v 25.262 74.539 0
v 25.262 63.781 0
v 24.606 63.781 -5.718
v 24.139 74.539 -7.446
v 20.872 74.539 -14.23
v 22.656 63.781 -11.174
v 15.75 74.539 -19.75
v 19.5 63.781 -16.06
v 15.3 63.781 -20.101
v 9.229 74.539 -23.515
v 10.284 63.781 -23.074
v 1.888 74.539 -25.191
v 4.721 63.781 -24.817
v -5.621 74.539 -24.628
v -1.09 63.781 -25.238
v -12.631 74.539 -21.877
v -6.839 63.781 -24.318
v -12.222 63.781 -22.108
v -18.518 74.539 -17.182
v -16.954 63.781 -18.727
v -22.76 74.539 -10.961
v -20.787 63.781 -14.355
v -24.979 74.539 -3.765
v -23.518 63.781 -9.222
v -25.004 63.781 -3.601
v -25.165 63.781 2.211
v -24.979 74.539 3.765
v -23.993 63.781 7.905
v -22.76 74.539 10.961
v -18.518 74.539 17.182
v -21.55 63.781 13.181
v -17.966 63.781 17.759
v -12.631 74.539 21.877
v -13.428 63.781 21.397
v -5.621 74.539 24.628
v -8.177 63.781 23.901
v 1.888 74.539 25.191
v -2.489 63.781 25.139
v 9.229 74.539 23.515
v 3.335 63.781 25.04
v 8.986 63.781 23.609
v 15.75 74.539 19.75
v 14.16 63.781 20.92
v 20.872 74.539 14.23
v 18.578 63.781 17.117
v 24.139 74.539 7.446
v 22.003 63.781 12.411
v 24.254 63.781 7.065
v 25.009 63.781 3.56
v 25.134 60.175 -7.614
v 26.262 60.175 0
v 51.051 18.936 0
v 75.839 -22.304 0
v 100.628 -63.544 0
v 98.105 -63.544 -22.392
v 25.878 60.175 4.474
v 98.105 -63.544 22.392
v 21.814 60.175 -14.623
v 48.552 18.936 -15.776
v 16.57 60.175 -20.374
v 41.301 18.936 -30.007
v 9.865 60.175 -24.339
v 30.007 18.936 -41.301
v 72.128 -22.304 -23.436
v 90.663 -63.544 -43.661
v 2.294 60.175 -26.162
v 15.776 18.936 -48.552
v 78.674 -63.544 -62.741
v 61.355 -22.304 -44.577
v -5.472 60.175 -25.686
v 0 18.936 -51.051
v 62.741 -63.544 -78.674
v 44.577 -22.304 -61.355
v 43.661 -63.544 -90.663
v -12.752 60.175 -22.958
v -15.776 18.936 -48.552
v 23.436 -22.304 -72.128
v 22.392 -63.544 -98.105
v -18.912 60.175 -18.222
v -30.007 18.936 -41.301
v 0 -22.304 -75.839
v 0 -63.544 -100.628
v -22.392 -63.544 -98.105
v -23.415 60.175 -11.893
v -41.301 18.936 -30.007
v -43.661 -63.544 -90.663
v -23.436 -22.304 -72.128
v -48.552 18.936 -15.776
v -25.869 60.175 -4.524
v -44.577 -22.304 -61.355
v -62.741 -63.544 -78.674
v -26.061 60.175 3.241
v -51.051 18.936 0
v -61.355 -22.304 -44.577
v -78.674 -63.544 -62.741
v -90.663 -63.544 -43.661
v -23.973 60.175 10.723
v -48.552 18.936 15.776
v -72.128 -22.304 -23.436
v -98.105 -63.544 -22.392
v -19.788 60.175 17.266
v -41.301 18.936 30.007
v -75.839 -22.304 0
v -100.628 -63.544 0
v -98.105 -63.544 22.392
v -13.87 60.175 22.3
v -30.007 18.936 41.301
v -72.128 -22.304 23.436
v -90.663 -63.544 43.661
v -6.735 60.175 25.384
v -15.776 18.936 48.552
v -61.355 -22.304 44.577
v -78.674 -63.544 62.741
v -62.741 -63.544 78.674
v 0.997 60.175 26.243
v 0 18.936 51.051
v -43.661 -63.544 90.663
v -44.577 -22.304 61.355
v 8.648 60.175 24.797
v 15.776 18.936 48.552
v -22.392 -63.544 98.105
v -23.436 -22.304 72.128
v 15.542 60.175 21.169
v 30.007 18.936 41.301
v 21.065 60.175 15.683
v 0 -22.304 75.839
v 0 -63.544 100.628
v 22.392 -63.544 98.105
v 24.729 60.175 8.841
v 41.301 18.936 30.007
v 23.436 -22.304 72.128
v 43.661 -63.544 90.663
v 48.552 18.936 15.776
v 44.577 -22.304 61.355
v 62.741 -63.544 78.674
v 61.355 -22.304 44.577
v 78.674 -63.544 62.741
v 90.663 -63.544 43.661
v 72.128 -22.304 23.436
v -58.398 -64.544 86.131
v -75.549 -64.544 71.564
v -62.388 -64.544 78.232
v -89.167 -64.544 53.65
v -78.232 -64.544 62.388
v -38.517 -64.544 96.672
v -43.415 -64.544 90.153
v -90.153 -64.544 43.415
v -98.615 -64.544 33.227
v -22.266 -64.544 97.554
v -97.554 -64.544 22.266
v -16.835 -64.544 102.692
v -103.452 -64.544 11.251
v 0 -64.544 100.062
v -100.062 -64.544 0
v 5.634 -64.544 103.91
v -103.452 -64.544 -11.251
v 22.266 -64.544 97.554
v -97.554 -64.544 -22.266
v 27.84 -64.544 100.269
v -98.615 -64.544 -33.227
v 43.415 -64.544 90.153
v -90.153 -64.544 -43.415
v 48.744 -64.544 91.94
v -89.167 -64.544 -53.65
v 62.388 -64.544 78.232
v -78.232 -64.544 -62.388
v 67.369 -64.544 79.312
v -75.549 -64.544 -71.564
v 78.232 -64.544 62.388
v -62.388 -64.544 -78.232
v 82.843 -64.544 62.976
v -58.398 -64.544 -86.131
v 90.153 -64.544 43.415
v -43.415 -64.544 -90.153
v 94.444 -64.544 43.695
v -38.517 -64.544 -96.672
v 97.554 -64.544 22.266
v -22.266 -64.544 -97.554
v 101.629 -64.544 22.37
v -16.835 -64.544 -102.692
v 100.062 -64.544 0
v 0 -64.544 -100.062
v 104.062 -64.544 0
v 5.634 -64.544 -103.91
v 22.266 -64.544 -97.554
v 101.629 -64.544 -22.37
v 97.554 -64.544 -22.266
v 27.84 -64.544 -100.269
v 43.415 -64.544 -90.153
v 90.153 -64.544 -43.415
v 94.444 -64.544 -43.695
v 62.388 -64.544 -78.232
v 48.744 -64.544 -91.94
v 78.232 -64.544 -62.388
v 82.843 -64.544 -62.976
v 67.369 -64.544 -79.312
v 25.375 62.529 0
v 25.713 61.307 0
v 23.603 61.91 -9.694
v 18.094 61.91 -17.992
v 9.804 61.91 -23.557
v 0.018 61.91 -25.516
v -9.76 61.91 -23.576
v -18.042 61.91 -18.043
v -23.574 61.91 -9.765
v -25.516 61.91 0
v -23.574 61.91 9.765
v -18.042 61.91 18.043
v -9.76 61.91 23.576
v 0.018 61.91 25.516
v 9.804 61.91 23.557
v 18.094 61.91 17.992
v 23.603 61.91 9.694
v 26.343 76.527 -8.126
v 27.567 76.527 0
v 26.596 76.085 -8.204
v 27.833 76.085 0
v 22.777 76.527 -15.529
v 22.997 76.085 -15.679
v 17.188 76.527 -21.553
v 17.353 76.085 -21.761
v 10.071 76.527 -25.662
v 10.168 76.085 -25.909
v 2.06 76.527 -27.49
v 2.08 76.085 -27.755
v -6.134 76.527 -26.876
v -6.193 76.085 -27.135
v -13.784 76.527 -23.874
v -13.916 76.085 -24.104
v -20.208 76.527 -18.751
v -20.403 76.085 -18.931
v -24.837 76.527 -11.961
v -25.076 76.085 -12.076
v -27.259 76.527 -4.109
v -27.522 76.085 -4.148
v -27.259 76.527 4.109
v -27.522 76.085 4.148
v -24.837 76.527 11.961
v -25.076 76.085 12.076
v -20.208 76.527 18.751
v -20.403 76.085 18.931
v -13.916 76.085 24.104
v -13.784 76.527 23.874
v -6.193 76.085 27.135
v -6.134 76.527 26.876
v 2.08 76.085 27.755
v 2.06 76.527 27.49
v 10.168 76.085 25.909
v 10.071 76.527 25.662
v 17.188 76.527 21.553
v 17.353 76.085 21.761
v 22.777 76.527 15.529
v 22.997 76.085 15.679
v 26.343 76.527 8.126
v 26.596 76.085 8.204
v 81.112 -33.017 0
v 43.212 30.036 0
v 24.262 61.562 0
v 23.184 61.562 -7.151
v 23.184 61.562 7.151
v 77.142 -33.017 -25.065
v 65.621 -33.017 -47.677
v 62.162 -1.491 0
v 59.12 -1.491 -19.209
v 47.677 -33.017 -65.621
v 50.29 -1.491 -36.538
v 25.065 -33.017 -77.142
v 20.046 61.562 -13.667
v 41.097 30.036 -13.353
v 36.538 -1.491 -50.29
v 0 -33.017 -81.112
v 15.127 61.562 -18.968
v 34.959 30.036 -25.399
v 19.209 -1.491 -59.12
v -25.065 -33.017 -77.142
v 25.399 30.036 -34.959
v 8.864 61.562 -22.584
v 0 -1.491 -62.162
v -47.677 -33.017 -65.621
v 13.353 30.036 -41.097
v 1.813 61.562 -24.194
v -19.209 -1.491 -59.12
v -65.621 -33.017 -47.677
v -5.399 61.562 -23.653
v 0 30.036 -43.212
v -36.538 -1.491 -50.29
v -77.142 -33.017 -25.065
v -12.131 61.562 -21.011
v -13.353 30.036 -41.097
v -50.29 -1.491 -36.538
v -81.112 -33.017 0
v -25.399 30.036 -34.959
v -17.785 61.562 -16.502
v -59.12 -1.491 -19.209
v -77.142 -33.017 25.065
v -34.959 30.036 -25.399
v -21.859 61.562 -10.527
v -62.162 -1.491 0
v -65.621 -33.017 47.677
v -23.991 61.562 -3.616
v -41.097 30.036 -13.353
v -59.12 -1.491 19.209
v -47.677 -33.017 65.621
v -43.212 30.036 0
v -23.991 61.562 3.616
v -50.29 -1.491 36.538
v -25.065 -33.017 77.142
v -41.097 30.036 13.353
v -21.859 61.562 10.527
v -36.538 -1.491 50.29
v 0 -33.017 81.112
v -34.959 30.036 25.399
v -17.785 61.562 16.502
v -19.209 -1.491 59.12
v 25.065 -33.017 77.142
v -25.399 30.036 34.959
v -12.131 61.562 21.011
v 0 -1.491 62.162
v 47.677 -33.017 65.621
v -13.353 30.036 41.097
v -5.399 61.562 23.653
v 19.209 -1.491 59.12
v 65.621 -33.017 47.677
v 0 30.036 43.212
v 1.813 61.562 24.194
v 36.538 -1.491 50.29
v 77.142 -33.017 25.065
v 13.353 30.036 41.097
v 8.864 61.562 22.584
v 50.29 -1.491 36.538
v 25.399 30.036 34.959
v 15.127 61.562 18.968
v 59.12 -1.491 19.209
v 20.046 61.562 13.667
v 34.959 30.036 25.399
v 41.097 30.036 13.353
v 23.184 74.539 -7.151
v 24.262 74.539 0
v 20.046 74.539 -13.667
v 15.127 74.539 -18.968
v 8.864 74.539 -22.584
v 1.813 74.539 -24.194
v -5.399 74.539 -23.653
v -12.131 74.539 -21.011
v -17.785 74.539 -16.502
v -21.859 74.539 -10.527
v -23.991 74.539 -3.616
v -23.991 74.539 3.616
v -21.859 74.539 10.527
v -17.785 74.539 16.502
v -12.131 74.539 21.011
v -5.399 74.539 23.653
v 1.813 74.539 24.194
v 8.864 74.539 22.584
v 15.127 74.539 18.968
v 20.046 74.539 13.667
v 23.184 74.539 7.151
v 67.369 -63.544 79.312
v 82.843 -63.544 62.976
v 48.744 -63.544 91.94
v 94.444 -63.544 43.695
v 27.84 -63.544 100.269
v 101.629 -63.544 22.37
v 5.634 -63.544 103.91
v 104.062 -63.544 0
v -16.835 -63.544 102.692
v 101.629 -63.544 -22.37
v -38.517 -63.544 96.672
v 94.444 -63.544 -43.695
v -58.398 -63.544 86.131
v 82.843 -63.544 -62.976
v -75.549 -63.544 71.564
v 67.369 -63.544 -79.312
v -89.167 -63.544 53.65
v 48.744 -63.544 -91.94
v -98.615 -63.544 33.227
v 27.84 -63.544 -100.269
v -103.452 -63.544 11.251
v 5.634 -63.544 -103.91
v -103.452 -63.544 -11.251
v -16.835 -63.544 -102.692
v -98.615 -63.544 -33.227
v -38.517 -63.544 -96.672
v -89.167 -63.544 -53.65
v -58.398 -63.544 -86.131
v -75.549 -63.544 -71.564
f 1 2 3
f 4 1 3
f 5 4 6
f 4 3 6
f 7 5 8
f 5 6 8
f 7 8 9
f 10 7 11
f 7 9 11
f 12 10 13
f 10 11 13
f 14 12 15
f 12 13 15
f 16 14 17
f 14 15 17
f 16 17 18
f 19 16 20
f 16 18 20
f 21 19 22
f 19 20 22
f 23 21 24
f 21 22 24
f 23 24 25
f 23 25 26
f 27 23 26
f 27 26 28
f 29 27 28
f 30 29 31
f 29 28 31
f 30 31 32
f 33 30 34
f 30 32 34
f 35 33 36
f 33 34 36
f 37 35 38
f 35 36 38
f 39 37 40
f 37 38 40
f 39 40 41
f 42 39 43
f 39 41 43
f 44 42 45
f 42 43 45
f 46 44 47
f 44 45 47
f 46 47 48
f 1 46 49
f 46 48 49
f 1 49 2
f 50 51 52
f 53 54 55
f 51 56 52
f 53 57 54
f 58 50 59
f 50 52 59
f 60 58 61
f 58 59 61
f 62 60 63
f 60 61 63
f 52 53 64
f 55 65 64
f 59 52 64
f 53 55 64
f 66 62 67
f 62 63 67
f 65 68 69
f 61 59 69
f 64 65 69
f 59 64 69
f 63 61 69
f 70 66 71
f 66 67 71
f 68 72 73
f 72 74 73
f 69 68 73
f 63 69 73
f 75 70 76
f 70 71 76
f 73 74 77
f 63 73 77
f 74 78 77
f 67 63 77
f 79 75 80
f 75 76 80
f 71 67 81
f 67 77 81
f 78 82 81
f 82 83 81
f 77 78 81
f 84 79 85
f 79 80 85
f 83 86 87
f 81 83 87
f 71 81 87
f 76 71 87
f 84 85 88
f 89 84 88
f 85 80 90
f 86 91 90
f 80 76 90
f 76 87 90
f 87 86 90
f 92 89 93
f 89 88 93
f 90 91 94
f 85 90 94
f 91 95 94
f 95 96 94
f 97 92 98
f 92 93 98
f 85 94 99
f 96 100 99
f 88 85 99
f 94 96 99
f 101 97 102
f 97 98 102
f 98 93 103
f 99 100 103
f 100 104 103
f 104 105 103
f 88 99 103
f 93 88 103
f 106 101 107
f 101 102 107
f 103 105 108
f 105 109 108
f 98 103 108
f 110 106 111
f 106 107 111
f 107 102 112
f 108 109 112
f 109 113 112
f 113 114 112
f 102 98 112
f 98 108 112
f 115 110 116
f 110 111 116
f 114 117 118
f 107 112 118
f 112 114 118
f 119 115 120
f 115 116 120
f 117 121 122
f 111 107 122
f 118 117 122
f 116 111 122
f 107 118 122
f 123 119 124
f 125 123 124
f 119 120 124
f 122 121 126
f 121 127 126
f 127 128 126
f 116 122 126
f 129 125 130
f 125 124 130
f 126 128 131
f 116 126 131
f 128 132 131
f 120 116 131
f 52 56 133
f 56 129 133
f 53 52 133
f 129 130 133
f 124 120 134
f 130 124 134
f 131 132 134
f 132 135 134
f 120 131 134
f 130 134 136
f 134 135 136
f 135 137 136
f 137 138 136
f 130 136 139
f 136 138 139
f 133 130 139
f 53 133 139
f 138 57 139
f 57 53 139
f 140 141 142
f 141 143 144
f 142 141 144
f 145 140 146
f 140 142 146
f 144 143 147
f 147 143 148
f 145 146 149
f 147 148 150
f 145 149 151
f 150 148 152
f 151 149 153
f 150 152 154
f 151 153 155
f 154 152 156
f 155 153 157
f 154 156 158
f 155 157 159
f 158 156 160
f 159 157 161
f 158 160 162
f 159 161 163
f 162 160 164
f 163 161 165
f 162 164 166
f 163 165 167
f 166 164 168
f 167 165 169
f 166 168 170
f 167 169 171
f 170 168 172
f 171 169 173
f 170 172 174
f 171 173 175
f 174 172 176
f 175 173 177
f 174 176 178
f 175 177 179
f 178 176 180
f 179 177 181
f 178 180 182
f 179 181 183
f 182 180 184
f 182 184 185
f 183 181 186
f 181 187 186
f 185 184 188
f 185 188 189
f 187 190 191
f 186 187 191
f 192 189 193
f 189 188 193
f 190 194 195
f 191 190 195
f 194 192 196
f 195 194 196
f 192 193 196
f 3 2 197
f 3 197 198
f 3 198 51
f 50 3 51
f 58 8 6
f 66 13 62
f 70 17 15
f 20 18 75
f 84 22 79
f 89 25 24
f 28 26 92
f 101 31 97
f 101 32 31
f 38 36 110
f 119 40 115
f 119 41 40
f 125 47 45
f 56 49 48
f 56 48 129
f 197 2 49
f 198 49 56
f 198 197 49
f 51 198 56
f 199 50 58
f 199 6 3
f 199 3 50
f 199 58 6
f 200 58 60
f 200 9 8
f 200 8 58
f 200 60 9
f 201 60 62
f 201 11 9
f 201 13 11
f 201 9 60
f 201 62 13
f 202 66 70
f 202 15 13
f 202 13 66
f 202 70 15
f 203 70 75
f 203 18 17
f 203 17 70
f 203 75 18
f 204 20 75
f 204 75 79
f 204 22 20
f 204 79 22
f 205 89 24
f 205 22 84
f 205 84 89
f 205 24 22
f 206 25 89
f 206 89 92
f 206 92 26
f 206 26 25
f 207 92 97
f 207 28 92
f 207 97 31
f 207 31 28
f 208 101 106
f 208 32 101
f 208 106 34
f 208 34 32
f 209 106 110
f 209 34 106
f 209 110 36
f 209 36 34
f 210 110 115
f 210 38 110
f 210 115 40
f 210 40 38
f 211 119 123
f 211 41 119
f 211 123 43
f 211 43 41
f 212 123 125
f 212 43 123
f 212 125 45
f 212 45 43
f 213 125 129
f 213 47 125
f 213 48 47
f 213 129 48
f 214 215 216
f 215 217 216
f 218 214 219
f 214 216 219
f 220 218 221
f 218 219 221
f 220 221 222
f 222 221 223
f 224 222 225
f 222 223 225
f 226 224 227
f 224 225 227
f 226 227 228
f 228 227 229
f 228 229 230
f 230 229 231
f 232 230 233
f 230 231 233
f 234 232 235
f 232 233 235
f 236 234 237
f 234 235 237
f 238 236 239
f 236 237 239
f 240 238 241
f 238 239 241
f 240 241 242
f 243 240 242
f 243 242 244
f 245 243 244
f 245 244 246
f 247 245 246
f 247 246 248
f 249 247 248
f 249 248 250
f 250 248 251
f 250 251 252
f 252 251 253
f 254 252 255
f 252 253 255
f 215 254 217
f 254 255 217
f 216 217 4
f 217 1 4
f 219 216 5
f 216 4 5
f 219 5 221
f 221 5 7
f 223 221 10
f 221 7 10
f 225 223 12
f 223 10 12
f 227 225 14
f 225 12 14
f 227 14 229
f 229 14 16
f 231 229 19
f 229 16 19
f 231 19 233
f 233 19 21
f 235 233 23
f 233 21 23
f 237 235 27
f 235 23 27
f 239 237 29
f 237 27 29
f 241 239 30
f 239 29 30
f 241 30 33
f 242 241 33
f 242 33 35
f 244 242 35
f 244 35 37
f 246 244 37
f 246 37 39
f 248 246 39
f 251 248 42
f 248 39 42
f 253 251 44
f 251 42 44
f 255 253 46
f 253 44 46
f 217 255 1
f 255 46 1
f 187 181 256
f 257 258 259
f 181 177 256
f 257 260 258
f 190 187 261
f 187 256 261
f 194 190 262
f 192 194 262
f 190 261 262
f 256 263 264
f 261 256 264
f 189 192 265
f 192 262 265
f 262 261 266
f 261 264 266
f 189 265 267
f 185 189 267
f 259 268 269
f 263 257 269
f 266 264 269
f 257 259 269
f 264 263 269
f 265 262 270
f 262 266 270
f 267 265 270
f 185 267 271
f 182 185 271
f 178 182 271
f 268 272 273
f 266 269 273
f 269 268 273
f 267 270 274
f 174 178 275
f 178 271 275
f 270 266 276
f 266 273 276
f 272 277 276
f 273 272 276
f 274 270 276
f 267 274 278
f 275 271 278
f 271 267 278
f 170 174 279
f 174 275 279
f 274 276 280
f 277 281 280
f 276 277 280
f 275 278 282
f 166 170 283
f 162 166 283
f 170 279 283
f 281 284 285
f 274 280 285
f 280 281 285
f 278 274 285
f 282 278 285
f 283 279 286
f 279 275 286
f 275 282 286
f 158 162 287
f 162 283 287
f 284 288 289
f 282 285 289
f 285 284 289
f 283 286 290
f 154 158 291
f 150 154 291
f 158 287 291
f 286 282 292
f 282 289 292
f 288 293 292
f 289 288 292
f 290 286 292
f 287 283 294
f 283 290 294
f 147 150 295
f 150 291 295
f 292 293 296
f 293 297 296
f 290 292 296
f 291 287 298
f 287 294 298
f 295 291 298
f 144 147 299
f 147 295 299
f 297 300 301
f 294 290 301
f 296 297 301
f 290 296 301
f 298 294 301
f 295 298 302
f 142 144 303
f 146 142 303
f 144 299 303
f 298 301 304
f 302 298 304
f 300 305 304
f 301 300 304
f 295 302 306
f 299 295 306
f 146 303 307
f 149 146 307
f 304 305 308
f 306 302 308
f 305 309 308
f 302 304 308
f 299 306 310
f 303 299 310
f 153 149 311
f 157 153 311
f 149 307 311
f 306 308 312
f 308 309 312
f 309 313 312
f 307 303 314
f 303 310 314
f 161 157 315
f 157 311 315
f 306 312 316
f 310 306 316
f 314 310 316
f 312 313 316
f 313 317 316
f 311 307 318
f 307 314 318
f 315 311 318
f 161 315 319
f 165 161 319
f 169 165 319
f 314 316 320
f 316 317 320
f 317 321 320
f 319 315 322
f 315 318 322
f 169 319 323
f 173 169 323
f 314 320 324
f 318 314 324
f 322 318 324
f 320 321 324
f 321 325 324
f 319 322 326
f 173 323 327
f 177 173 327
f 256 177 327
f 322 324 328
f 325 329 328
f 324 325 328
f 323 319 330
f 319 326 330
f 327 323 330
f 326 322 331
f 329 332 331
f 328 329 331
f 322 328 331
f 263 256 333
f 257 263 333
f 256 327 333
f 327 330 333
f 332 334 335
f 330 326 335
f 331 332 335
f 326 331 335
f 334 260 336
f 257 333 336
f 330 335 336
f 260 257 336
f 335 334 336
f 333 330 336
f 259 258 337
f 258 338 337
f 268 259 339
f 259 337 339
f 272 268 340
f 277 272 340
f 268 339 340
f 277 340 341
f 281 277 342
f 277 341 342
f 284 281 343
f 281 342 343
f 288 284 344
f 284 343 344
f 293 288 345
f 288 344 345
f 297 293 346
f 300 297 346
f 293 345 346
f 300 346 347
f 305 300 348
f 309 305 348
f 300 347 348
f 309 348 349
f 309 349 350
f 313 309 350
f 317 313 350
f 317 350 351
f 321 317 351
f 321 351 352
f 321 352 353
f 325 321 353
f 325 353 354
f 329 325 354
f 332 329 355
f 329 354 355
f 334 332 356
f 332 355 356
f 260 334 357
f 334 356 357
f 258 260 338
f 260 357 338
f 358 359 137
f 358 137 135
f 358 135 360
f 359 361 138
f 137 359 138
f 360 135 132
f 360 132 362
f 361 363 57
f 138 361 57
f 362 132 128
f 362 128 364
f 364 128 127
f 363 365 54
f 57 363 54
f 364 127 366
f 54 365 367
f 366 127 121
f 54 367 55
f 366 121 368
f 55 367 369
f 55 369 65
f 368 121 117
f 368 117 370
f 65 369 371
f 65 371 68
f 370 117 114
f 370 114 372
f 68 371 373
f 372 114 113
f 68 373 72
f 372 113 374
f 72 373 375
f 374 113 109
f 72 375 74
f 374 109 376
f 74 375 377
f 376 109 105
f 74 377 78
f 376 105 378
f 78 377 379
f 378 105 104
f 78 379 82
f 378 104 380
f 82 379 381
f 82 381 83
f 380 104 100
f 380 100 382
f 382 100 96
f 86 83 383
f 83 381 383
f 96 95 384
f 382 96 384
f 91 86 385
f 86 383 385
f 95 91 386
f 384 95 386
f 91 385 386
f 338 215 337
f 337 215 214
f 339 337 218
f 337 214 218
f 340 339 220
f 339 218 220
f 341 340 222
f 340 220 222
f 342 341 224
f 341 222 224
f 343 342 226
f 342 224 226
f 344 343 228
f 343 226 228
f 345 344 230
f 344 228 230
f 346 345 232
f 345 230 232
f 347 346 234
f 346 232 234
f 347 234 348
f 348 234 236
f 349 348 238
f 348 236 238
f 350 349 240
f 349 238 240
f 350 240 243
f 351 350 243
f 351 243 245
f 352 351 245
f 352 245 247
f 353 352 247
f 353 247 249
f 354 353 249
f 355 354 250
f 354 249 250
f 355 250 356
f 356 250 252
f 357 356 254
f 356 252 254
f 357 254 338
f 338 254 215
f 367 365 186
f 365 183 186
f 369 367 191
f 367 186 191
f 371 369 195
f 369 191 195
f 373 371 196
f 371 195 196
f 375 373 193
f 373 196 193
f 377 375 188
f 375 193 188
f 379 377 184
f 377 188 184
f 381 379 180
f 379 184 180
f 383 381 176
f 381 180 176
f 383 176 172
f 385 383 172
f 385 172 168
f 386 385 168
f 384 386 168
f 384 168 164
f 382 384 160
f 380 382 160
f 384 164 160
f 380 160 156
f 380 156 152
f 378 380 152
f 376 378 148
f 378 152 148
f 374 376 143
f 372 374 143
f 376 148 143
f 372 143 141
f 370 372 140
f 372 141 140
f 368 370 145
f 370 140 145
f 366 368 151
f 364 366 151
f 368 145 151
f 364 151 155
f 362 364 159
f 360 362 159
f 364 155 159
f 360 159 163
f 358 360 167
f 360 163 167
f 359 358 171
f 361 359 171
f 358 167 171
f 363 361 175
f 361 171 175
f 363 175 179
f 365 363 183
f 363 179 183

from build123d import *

# Parameters (mm, degrees)
FILLET1_R = 7


with BuildPart() as part:
    # Sketch1 → Revolve1 (revolve)
    with BuildSketch(Plane.XY):
        Polygon((25.26151891, 74.539497083), (25.26151891, 61.839497083), (100.628081163, -63.543576688), (104.062419804, -63.543576688), (104.062419804, -64.543576688), (100.062419804, -64.543576688), (24.26151891, 61.562081639), (24.26151891, 74.539497083), (27.567346656, 76.526598412), (27.832759941, 76.085045388), align=None)
    revolve(axis=Axis((0, 0, 0), (0, 1, 0)))

    # Fillet1
    fillet1_edges = [part.edges().sort_by_distance(p)[0] for p in [
        (-25.26151891, 61.839497083, 0),
    ]]
    fillet(fillet1_edges, radius=FILLET1_R)


solid = part.part
